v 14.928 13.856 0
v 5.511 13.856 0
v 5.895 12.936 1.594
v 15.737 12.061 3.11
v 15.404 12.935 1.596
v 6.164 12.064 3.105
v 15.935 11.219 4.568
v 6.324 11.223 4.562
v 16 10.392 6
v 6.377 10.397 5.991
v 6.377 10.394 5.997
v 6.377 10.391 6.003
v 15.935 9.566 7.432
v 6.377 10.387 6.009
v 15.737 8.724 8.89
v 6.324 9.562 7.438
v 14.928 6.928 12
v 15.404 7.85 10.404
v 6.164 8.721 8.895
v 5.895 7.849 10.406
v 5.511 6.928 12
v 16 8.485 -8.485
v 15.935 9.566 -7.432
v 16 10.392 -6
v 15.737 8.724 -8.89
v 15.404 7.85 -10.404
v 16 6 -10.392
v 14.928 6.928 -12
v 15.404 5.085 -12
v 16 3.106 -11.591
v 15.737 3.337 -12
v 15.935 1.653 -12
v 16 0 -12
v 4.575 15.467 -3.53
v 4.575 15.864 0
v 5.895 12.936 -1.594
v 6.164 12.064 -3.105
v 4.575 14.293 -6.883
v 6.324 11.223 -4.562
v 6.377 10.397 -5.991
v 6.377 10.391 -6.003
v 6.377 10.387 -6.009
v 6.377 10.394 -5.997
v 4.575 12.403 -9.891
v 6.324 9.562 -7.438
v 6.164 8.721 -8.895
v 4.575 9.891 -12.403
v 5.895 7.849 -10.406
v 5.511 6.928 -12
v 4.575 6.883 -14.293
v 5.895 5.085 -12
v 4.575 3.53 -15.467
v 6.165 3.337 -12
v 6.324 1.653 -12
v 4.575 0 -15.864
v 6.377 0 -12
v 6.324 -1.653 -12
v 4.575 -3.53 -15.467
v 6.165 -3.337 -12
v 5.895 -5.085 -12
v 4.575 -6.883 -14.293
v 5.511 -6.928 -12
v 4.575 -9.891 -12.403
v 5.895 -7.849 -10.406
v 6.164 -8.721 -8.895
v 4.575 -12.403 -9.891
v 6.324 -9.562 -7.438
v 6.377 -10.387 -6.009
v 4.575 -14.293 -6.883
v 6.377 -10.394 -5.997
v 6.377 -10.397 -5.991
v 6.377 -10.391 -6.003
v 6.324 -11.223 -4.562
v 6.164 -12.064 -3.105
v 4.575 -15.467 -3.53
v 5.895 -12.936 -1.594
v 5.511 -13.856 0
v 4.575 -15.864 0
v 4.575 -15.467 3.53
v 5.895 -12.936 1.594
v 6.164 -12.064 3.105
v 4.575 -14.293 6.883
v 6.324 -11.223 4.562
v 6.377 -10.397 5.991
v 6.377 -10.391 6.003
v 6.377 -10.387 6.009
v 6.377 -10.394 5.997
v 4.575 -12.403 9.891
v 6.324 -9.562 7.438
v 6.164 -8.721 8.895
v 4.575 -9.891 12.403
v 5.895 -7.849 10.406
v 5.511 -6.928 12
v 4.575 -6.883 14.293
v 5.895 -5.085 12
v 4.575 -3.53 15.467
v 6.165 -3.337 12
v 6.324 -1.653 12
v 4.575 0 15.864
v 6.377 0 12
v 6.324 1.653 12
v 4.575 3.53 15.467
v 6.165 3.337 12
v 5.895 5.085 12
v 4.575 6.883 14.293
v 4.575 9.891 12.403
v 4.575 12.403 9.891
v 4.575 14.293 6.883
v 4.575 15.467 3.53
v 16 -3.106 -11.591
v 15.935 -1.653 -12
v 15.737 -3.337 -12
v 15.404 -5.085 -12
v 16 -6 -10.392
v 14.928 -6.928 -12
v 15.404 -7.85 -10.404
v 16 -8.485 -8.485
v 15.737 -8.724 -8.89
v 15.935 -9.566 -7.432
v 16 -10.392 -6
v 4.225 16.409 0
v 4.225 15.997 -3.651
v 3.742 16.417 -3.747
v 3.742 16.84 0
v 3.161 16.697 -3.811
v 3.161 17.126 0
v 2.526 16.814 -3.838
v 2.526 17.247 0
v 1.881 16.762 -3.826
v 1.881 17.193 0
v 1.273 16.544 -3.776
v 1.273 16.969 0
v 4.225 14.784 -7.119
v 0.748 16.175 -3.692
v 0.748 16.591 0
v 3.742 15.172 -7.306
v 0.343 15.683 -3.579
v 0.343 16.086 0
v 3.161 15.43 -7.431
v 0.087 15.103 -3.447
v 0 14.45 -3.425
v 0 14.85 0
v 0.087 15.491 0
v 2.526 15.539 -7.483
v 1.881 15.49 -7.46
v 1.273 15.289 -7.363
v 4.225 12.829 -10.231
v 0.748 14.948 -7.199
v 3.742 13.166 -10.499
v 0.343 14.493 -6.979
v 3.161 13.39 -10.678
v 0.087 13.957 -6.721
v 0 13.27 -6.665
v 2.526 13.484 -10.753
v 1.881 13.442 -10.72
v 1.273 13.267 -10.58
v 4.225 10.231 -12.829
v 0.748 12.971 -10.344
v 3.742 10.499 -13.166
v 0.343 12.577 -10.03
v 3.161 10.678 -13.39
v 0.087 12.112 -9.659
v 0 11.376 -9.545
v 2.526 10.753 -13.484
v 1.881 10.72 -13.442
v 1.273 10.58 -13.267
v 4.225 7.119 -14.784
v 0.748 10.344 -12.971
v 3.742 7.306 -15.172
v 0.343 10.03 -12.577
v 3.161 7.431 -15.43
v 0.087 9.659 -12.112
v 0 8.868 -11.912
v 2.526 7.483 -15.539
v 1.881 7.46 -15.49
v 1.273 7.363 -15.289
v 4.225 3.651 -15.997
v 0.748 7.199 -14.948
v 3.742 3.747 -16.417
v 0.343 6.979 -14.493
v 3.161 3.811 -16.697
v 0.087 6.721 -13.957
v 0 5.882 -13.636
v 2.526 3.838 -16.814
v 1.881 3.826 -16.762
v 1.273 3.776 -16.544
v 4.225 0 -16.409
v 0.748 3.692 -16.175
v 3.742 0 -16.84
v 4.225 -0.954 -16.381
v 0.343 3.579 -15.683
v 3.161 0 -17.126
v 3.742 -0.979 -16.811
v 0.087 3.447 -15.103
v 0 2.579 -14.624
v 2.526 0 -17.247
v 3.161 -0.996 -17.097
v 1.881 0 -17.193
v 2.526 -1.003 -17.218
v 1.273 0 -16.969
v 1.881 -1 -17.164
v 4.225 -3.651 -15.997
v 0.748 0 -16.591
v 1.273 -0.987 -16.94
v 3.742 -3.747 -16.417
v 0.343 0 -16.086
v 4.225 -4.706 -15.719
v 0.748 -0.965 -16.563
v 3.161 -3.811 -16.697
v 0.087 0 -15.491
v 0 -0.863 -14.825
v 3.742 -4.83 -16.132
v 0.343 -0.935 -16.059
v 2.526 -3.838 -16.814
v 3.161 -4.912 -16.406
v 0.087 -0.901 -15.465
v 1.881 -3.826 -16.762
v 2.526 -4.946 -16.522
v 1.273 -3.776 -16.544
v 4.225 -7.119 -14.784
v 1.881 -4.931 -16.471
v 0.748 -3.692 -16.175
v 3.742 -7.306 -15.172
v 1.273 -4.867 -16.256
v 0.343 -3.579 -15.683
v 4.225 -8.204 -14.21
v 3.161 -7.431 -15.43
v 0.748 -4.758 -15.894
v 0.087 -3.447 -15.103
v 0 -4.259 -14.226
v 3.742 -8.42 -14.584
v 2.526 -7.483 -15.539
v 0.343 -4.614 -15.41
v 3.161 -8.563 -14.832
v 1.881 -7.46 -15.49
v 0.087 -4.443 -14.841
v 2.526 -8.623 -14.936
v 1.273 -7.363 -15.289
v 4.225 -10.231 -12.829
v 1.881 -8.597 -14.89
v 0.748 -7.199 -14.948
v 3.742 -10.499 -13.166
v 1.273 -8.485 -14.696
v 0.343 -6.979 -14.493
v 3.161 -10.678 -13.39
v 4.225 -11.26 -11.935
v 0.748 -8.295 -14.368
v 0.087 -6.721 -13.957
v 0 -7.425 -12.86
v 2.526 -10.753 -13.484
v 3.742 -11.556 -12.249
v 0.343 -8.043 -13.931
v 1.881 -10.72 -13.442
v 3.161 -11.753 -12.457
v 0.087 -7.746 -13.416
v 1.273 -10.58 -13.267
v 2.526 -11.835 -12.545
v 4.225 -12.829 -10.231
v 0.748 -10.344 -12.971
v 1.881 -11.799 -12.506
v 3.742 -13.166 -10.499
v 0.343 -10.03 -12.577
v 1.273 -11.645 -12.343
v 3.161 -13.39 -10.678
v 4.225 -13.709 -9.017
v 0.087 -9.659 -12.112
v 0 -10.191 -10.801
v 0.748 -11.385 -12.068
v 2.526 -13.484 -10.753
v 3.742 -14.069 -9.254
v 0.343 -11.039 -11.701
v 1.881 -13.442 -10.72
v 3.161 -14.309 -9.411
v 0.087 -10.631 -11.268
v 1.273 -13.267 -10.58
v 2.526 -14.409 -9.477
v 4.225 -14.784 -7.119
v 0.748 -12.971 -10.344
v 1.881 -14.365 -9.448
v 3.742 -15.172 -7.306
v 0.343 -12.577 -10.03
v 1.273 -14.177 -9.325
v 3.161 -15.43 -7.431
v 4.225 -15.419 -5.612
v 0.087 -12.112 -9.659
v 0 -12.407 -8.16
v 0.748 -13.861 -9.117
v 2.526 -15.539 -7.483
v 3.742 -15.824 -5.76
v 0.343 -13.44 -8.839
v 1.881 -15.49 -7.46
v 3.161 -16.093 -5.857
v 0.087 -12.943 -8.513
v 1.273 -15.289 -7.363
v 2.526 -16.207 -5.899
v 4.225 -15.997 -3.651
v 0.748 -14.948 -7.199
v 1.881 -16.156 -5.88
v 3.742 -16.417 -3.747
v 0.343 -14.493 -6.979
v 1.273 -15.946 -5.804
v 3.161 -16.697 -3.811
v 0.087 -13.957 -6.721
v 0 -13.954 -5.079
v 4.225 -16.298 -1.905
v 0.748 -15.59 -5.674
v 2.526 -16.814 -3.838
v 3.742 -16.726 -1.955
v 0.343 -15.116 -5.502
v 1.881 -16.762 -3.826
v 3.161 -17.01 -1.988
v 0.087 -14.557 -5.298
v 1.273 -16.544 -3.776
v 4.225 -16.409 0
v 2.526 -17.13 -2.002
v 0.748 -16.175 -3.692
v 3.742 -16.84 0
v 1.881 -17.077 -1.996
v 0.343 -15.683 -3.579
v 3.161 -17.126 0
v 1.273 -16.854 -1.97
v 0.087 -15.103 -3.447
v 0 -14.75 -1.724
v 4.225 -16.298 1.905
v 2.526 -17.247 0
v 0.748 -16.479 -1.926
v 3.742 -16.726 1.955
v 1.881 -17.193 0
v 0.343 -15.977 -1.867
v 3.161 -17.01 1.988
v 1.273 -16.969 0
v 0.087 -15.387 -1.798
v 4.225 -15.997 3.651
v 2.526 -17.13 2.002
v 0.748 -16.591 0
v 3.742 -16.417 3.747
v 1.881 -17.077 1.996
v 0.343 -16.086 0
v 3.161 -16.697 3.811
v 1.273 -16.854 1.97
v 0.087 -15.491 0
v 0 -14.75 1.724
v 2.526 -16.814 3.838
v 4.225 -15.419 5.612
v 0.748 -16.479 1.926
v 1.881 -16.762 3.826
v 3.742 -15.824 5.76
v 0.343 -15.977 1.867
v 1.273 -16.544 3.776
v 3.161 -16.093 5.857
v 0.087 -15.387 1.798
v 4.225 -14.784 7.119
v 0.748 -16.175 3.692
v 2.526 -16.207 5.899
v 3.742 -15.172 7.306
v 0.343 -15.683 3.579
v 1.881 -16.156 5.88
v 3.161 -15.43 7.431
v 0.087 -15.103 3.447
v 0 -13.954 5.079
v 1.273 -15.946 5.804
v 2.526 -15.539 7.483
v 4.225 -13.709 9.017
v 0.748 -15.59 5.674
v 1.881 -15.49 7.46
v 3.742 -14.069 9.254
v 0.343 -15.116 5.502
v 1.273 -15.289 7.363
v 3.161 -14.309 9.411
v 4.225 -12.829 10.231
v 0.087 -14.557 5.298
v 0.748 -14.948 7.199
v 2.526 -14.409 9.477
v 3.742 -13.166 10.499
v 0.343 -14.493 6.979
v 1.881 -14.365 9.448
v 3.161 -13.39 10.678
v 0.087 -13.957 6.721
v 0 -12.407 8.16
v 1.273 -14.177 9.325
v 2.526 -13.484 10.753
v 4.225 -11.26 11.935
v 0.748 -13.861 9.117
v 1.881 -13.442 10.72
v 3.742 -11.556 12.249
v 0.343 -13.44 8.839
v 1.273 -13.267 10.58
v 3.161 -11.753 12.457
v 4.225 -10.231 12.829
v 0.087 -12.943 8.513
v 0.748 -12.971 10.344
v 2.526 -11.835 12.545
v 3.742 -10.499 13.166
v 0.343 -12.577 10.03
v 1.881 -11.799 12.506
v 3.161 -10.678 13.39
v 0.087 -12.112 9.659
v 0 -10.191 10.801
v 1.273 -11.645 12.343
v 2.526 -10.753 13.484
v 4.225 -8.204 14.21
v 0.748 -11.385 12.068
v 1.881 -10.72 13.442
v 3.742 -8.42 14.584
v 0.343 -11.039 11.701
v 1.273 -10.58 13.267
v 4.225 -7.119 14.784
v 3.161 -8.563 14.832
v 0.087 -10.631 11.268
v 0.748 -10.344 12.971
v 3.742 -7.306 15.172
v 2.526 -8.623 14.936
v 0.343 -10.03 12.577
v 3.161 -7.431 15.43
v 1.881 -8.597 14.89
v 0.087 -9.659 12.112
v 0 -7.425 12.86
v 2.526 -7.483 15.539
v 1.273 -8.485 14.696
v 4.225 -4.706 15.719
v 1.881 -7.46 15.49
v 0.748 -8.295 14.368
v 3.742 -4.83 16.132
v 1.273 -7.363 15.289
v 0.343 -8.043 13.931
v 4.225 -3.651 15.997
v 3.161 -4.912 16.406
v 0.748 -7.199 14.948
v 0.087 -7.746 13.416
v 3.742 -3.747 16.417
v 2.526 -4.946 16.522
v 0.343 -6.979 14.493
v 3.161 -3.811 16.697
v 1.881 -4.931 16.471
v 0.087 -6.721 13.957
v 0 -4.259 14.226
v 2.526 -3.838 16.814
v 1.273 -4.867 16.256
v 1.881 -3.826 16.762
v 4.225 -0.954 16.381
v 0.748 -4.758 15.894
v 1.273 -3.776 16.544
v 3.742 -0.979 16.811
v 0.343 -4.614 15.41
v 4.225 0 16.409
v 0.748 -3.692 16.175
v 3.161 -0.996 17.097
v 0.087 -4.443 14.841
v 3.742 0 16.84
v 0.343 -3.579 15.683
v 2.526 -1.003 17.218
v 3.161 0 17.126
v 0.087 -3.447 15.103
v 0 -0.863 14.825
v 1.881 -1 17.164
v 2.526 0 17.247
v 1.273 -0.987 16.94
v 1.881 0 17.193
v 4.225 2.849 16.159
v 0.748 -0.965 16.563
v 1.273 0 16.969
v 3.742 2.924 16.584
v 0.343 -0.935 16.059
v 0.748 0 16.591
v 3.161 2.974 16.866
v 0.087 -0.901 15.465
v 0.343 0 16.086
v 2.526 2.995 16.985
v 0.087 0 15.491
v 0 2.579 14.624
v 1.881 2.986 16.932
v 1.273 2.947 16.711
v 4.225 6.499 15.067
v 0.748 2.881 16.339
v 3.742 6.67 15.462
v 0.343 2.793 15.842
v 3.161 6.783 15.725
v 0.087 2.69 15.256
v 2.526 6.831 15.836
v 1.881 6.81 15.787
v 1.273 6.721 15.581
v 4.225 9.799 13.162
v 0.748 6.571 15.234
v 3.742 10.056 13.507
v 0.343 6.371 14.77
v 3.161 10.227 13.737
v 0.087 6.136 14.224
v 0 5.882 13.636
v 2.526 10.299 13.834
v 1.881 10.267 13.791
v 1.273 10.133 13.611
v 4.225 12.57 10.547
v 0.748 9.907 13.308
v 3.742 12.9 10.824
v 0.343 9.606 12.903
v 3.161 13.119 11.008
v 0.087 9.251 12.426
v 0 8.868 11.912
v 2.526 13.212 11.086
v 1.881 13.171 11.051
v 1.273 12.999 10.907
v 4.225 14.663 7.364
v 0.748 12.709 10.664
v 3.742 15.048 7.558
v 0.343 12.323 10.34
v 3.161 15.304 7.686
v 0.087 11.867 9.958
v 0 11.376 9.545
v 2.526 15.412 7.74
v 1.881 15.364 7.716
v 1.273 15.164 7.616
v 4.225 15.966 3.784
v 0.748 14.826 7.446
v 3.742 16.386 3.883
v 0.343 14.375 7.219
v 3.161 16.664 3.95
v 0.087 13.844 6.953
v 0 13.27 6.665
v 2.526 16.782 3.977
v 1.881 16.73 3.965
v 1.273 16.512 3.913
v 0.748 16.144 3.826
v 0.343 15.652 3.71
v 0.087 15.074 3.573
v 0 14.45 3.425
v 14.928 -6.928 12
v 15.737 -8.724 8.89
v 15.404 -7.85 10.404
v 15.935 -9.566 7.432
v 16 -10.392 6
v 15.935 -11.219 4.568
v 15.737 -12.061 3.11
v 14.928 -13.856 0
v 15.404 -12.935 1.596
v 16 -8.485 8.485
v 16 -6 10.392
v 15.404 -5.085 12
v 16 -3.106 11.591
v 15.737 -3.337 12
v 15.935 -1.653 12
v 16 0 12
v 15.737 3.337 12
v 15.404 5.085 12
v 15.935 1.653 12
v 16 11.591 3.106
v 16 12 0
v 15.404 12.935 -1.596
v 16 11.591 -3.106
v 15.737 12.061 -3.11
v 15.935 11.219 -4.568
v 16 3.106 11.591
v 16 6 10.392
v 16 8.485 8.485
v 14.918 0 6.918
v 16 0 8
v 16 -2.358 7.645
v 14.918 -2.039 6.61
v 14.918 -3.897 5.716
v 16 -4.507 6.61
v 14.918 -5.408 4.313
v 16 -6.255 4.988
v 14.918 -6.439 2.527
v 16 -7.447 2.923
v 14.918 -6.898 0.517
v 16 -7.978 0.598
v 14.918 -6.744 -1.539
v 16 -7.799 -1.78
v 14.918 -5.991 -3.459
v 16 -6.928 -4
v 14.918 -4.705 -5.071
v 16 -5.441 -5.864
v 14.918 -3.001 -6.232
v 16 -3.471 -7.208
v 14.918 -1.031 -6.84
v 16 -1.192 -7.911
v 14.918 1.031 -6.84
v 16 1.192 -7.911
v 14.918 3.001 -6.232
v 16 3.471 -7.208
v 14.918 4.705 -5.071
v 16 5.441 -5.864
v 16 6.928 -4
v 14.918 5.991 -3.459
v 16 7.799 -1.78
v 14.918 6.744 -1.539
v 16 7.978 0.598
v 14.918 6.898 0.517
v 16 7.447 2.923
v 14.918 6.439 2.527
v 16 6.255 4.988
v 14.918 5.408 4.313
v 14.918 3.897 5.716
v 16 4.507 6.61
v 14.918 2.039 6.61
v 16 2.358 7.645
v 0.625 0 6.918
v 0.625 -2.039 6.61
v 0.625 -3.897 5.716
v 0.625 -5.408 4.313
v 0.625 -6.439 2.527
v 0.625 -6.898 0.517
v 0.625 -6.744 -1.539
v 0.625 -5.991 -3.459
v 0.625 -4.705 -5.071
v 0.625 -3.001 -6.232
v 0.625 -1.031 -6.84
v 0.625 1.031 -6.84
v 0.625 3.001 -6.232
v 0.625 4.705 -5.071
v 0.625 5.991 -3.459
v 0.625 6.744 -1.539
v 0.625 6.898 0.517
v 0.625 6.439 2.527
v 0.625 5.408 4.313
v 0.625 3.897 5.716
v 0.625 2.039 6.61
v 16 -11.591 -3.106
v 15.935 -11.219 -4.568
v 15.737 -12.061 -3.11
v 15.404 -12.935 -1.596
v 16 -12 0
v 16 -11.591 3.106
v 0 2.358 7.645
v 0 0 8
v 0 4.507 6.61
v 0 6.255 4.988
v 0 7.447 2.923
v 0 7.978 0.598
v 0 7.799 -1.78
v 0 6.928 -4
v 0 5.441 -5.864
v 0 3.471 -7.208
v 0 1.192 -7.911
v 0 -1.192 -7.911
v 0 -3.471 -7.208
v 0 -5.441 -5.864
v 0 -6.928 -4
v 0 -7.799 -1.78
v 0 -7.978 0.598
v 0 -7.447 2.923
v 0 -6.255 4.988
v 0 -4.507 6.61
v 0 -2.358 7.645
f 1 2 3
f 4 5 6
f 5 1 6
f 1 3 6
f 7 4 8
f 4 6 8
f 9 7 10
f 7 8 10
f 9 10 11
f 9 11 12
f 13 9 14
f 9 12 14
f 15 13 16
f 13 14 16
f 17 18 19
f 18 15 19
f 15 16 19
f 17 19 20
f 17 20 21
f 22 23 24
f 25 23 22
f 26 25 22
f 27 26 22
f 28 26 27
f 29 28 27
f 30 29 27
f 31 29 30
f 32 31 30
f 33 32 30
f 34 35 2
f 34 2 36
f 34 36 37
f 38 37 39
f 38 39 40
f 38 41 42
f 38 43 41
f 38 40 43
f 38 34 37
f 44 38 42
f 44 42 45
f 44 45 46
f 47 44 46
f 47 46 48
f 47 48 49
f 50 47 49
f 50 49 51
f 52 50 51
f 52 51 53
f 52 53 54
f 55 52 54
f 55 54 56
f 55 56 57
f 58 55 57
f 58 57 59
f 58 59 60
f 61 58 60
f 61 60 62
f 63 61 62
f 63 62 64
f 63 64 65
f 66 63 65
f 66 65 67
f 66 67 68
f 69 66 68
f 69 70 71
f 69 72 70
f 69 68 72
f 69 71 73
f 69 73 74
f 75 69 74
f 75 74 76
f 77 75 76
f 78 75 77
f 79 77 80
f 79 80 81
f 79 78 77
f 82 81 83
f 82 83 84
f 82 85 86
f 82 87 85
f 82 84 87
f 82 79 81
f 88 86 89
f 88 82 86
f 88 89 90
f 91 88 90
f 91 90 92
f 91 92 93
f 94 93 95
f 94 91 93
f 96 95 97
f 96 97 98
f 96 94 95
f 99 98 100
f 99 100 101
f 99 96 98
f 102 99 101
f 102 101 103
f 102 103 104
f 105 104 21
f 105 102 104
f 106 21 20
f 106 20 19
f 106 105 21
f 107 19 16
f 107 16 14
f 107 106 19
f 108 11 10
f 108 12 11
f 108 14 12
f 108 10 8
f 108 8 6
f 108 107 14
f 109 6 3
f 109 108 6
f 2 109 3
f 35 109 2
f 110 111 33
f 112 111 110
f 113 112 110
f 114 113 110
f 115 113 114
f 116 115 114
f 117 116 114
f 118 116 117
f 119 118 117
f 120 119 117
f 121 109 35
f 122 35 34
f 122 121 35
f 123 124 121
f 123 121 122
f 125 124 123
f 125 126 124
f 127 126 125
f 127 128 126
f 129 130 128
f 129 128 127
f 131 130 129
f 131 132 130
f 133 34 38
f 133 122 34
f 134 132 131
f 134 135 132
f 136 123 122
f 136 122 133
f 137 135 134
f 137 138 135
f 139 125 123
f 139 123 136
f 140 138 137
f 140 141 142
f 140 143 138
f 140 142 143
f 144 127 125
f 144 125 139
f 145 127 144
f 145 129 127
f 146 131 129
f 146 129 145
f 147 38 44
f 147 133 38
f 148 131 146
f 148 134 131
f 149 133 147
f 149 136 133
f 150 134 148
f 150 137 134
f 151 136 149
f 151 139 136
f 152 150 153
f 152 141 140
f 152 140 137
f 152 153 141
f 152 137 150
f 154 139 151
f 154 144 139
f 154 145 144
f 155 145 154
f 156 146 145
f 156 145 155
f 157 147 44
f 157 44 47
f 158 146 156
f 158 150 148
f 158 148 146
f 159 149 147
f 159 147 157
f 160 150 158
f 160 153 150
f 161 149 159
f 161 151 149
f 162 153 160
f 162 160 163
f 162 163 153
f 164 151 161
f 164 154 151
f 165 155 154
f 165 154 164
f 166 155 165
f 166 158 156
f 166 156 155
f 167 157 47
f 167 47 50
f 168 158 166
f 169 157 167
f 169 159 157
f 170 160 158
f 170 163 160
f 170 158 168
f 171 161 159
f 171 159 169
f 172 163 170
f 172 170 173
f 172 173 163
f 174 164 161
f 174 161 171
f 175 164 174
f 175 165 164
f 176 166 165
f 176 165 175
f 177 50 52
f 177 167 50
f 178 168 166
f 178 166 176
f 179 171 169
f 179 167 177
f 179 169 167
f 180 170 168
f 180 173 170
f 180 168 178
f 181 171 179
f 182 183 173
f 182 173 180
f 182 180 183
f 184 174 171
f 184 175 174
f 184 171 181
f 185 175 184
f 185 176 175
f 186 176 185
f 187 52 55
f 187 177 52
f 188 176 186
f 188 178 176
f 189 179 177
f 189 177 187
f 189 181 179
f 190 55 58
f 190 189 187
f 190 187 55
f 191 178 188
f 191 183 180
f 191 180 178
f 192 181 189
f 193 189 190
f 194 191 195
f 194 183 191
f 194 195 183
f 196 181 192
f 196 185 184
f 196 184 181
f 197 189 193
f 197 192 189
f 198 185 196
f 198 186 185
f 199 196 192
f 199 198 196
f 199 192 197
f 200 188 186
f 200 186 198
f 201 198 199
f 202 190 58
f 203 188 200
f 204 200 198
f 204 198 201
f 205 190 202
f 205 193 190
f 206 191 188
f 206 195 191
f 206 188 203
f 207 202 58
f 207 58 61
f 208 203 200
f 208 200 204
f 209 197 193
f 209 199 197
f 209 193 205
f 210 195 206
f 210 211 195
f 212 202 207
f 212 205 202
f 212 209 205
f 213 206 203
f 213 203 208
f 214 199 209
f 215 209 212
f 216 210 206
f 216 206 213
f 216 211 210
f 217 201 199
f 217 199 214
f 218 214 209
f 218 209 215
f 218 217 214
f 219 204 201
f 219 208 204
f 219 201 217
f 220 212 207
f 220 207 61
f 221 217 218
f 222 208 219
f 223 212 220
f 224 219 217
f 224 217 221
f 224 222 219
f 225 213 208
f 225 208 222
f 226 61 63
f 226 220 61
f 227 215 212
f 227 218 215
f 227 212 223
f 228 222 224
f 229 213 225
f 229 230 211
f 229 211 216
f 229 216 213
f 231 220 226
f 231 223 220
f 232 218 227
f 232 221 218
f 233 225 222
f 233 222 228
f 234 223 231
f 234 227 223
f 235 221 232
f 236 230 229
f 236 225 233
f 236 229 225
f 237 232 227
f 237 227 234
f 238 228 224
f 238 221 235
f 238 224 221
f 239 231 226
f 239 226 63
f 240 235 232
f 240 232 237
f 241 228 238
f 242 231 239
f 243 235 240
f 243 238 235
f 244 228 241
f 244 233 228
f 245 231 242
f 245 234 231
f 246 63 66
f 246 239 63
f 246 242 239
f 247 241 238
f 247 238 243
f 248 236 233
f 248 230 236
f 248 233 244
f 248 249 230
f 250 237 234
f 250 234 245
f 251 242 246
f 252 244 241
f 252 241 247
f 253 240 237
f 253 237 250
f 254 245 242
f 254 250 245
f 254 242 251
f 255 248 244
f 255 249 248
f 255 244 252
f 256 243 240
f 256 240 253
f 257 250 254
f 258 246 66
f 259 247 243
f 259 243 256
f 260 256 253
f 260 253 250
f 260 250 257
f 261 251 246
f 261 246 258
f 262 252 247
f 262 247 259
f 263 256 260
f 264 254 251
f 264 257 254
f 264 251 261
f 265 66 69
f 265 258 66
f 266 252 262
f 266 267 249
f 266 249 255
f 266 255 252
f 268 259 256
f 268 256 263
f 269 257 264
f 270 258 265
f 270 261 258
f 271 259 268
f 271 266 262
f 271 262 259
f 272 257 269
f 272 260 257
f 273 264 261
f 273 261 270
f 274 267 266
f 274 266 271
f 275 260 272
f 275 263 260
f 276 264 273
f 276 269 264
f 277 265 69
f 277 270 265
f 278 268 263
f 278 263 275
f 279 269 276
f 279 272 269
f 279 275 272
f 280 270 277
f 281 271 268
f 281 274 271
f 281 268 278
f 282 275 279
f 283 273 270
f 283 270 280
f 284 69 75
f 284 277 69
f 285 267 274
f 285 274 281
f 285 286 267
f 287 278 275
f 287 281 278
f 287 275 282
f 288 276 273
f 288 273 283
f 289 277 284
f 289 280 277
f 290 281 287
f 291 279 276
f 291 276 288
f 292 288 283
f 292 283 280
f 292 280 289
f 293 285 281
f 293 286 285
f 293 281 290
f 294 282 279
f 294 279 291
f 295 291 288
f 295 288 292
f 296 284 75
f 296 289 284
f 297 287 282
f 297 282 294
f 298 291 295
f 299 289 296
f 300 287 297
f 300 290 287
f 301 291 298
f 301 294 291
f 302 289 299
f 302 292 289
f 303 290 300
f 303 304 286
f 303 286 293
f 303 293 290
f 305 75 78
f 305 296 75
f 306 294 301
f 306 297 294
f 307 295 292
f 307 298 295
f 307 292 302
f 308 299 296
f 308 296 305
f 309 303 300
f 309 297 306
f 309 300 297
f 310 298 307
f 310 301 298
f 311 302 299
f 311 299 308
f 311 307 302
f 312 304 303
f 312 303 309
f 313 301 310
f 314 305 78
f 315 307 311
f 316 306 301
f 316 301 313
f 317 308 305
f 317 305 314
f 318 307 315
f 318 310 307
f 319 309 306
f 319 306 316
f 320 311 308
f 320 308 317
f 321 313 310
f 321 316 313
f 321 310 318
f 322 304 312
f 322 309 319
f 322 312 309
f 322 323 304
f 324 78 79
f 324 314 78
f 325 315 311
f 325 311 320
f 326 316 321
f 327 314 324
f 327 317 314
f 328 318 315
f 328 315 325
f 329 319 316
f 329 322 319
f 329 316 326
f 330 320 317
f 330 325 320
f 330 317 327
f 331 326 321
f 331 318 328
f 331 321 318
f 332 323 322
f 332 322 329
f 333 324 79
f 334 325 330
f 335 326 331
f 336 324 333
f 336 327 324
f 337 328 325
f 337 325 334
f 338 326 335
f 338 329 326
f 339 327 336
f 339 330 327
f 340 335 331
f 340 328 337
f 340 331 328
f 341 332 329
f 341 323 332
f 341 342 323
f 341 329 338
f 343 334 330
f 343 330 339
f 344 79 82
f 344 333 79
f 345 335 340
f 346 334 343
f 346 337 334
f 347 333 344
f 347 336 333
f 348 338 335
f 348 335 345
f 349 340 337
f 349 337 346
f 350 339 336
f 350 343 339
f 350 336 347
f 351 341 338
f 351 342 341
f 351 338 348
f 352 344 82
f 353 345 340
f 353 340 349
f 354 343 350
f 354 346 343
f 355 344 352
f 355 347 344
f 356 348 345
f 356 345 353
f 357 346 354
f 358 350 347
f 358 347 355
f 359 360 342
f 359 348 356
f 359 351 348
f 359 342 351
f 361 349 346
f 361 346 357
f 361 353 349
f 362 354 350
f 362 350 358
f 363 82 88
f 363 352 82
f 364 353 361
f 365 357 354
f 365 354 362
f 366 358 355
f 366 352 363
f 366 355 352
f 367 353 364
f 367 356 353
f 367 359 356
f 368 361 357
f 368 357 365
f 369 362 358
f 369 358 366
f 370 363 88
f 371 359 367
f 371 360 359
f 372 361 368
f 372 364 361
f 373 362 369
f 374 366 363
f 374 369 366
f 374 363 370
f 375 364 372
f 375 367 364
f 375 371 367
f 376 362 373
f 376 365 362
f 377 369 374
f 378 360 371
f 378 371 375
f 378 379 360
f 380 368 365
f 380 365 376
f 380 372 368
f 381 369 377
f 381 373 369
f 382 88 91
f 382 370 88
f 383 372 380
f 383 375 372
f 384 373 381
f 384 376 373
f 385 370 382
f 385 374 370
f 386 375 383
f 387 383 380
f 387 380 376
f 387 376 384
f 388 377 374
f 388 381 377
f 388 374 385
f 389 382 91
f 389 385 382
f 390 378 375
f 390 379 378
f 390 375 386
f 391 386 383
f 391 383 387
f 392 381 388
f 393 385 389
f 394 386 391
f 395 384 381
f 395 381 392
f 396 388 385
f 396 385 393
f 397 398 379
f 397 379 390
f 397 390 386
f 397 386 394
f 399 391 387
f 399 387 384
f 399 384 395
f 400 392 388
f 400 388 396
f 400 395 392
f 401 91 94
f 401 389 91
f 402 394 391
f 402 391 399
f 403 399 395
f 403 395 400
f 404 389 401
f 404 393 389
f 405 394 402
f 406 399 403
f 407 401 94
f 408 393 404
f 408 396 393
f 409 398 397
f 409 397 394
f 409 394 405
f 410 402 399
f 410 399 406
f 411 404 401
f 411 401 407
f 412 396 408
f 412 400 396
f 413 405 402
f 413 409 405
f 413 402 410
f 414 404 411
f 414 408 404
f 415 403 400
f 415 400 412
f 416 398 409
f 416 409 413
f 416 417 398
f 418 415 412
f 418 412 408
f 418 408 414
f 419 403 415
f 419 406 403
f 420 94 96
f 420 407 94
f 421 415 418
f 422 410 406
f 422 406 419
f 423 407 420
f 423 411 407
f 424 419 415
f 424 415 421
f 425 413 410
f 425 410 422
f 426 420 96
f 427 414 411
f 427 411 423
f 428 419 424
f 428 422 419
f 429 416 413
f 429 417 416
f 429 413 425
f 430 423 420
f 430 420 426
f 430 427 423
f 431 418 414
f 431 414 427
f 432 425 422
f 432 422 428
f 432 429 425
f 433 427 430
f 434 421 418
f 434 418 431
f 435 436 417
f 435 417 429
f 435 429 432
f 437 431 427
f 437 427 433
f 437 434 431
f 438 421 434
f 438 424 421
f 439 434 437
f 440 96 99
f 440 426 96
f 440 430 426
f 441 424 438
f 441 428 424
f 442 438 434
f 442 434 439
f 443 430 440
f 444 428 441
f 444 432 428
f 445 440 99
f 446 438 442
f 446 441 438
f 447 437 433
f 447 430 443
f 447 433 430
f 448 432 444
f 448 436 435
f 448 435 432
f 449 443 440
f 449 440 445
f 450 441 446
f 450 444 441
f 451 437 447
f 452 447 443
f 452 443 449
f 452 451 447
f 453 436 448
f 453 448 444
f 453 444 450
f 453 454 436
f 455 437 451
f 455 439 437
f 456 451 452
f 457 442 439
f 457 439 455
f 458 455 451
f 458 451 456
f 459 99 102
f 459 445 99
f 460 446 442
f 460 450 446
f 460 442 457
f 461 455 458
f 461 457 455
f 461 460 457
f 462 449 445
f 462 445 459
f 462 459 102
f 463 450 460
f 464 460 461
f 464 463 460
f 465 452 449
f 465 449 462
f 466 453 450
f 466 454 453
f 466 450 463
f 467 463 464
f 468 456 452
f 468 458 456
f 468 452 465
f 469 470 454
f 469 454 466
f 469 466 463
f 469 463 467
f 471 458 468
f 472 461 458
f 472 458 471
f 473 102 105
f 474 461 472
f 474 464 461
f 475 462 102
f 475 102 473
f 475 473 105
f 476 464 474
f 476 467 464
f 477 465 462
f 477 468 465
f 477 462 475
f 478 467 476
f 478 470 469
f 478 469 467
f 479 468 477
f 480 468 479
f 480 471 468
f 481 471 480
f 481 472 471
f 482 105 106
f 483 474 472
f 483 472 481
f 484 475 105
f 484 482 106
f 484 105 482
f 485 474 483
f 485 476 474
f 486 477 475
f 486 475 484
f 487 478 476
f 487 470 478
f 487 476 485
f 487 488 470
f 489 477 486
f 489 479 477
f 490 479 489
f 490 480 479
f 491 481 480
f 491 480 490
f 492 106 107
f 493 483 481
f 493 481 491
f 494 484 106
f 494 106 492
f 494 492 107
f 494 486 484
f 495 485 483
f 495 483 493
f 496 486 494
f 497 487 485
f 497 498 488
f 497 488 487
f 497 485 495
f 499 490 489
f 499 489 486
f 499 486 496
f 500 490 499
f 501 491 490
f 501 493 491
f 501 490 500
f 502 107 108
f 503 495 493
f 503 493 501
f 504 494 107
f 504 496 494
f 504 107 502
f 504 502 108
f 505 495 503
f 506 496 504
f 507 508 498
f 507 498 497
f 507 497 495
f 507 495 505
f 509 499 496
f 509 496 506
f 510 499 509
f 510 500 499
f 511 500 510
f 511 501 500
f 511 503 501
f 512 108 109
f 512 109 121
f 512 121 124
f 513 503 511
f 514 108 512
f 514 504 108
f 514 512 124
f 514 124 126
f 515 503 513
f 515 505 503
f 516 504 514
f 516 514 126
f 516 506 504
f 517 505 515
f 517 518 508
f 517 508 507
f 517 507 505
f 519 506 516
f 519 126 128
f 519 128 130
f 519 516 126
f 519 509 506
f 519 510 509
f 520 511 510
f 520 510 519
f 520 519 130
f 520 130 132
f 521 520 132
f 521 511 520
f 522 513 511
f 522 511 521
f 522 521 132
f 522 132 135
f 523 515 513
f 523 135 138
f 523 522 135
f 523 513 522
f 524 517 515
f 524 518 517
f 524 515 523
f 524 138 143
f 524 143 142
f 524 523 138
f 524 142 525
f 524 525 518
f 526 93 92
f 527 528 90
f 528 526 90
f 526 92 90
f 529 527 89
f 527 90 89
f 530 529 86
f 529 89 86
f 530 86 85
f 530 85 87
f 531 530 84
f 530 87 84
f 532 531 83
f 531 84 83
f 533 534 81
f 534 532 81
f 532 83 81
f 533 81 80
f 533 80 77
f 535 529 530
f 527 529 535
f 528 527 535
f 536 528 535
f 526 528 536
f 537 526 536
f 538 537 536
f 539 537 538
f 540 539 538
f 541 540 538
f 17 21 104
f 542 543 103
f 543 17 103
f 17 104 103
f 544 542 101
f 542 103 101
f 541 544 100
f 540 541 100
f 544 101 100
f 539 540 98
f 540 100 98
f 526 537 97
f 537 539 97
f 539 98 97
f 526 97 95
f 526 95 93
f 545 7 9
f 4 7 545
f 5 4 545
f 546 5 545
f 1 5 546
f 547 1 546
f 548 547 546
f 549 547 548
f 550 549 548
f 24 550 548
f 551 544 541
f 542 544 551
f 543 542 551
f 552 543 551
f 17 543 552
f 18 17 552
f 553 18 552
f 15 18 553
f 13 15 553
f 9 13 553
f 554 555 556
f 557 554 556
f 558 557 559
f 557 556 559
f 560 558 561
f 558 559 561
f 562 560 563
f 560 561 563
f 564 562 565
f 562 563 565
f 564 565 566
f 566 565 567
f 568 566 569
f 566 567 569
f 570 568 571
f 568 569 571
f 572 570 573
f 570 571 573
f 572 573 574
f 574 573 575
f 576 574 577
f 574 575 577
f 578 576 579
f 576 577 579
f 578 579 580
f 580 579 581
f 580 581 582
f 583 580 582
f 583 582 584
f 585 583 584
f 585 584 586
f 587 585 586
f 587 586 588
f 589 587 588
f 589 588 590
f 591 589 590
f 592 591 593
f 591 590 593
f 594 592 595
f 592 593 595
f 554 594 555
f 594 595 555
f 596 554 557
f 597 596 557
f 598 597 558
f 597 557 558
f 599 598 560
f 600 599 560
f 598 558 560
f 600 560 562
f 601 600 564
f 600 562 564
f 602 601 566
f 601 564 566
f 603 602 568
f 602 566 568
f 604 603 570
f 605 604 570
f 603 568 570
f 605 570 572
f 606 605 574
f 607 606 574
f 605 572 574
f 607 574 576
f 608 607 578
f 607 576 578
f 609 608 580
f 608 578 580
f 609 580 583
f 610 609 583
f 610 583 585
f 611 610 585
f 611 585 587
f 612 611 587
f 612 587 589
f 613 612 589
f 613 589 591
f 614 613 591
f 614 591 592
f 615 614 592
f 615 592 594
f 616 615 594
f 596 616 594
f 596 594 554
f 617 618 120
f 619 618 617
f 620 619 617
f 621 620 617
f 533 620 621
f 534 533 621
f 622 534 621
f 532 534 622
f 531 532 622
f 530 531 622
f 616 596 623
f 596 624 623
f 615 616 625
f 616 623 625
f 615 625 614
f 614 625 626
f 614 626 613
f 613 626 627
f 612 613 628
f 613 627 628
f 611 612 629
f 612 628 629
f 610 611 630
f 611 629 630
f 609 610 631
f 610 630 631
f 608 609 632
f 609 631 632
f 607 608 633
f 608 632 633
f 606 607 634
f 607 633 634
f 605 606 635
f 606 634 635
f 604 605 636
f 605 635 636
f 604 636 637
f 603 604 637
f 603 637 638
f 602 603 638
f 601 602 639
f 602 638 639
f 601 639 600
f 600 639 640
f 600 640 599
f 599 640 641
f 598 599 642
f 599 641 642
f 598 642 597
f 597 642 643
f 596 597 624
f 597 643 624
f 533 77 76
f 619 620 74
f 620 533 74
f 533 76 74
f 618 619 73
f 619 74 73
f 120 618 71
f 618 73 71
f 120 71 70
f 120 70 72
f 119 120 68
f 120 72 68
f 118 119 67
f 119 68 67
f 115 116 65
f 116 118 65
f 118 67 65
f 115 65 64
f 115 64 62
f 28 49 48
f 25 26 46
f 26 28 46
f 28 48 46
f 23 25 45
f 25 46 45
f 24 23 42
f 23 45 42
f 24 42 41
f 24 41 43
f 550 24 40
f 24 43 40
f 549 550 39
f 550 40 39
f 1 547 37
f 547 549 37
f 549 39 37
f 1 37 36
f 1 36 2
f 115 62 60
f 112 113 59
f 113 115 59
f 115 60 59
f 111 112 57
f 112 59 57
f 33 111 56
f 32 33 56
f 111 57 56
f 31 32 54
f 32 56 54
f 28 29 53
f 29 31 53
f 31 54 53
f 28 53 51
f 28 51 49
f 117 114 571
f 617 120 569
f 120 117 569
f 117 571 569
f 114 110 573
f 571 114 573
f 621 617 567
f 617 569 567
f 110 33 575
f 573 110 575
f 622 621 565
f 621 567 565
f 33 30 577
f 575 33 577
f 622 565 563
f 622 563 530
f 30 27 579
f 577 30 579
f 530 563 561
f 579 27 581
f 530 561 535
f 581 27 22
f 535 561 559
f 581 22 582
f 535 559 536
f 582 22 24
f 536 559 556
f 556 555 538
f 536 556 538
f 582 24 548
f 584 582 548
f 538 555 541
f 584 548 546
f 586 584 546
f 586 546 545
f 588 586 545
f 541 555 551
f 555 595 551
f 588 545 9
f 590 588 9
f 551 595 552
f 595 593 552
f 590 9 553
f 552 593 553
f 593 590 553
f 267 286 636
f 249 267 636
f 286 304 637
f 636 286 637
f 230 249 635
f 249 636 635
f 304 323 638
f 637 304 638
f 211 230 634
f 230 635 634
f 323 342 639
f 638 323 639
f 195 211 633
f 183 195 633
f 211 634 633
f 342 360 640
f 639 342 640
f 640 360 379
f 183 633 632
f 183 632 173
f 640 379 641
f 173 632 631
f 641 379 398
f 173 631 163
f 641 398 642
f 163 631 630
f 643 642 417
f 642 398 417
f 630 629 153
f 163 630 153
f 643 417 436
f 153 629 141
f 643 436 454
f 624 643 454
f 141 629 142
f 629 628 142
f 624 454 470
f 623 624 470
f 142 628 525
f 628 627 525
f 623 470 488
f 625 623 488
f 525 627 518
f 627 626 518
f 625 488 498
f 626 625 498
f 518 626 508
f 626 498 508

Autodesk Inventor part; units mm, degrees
ref_plane "YZ Plane" through (0, 0, 0) normal (1, 0, 0) x (0, 1, 0)
ref_plane "XZ Plane" through (0, 0, 0) normal (0, 1, 0) x (-1, 0, 0)
sketch "Sketch1" plane through (0, 0, 0) normal (0, 0, 1) x (1, 0, 0)
  line L0 (-3.6884, 0) -> (19.2814, 0) projected
  line L1 (6.3771, 12) -> (4.5751, 15.8643)
  line L2 (6.3771, 12) -> (16, 12) construction
  line L3 (16, 12) -> (16, 0) construction
  arc A0 (4.5751, 15.8643) -> (0, 14.85) centre (2.4, 14.85) ccw
  line L4 (6.3771, 12) -> (6.3771, 0)
  line L5 (0, -3.5401) -> (0, 21.2403) projected
  point P0 (0, 0)
  dimension "d2" = 24
  dimension "d4" = 34.5
  dimension "d5" = 2.4
  dimension "d15" = 16
  dimension "d16" = 25
revolve "Ring" add sketch "Sketch1" angle 360 about axis through (-10, 0, 0) along (1, 0, 0)
sketch "Sketch2" plane through (0, 0, 0) normal (-1, 0, 0) x (0, 0, 1)
  circle A0 centre (0, 0) radius 4.9
  line L0 (-12, -6.9282) -> (-12, 6.9282)
  line L1 (-12, 6.9282) -> (0, 13.8564)
  line L2 (0, 13.8564) -> (12, 6.9282)
  line L3 (12, 6.9282) -> (12, -6.9282)
  line L4 (12, -6.9282) -> (0, -13.8564)
  line L5 (0, -13.8564) -> (-12, -6.9282)
  circle A1 centre (0, 0) radius 14.85 projected
  dimension "d6" = 27.7128
extrude "Body" add sketch "Sketch2" against normal blind 16 contours A0 | L0 L1 L2 L3 L4 L5
sketch "Sketch3" plane through (0, 0, 0) normal (0, 0, 1) x (1, 0, 0)
  line L0 (5.5114, 13.8564) -> (16, 13.8564) projected
  line L1 (16, 6.9282) -> (16, 13.8564) projected
  line L2 (0, -14.85) -> (0, 14.85) projected
  line L3 (-3.2, 0) -> (19.2, 0) projected
  line L4 (14.9282, 13.8564) -> (16, 12)
  dimension "d10" = 30
  dimension "d11" = 24
revolve "Chamfer1" cut sketch "Sketch3" angle 360 about axis through (-10, 0, 0) along (1, 0, 0)
sketch "Sketch4" plane through (0, 0, 0) normal (-1, 0, 0) x (0, 0, 1)
  circle A0 centre (0, 0) radius 14.85 projected
hole "Thread" at (0, 0, 0) direction (1, 0, 0) diameter 13.835 end through all thread size "M16x2" class "6H" standard "ISO Metric profile"
chamfer "Chamfer2" distance 1.0825 angle 30 1 edges at (0, 0, -6.9175) measured on face at (0, 12.0452, -1.4626)
ref_plane "Work Plane1" through (51.3469, 0, 0) normal (0, 0, -1) x (-1, 0, 0)
chamfer "Chamfer3" distance 1.0825 angle 45 1 edges at (16, 0, -6.9175)
equation "\"d6\" = 1.1547 * SW"
equation "\"d7\" = KOH"
equation "\"d12\" = -0.5 * GD1 + 0.5 * NND"
equation "\"d46\" = -0.5 * GD1 + 0.5 * NND"
equation "\"d51\" = -0.5 * GD1 + 0.5 * NND"
equation "\"d2\" = SW"
equation "\"d4\" = LADI"
equation "\"d5\" = PHH"
equation "\"d15\" = KOH"
equation "\"d16\" = KEWI"
equation "\"d10\" = ANG1"
equation "\"d11\" = SW0"
equation "\"ANG1\" = 30deg"
equation "\"KEWI\" = 25deg"
equation "\"NND\" = 16"
equation "\"LADI\" = 34.5"
equation "\"SW\" = 24"
equation "\"PHH\" = 2.4"
equation "\"KOH\" = NND"
equation "\"SW0\" = 24"
equation "\"d1\" = LADI"
equation "\"d3\" = PHH"
equation "\"GUL\" = 0.541266 * PTC"
equation "\"RR\" = PHH"
equation "\"THREADDIA\" = 16"
equation "\"TOA\" = 30deg"
equation "\"PTC\" = 2"
equation "\"GAL\" = 0.541266 * PTC"
equation "\"E0\" = 1.155 * SW"
equation "\"GD1\" = 13.834936"
properties part number "ISO 4161 - M16" material "Stainless Steel"
